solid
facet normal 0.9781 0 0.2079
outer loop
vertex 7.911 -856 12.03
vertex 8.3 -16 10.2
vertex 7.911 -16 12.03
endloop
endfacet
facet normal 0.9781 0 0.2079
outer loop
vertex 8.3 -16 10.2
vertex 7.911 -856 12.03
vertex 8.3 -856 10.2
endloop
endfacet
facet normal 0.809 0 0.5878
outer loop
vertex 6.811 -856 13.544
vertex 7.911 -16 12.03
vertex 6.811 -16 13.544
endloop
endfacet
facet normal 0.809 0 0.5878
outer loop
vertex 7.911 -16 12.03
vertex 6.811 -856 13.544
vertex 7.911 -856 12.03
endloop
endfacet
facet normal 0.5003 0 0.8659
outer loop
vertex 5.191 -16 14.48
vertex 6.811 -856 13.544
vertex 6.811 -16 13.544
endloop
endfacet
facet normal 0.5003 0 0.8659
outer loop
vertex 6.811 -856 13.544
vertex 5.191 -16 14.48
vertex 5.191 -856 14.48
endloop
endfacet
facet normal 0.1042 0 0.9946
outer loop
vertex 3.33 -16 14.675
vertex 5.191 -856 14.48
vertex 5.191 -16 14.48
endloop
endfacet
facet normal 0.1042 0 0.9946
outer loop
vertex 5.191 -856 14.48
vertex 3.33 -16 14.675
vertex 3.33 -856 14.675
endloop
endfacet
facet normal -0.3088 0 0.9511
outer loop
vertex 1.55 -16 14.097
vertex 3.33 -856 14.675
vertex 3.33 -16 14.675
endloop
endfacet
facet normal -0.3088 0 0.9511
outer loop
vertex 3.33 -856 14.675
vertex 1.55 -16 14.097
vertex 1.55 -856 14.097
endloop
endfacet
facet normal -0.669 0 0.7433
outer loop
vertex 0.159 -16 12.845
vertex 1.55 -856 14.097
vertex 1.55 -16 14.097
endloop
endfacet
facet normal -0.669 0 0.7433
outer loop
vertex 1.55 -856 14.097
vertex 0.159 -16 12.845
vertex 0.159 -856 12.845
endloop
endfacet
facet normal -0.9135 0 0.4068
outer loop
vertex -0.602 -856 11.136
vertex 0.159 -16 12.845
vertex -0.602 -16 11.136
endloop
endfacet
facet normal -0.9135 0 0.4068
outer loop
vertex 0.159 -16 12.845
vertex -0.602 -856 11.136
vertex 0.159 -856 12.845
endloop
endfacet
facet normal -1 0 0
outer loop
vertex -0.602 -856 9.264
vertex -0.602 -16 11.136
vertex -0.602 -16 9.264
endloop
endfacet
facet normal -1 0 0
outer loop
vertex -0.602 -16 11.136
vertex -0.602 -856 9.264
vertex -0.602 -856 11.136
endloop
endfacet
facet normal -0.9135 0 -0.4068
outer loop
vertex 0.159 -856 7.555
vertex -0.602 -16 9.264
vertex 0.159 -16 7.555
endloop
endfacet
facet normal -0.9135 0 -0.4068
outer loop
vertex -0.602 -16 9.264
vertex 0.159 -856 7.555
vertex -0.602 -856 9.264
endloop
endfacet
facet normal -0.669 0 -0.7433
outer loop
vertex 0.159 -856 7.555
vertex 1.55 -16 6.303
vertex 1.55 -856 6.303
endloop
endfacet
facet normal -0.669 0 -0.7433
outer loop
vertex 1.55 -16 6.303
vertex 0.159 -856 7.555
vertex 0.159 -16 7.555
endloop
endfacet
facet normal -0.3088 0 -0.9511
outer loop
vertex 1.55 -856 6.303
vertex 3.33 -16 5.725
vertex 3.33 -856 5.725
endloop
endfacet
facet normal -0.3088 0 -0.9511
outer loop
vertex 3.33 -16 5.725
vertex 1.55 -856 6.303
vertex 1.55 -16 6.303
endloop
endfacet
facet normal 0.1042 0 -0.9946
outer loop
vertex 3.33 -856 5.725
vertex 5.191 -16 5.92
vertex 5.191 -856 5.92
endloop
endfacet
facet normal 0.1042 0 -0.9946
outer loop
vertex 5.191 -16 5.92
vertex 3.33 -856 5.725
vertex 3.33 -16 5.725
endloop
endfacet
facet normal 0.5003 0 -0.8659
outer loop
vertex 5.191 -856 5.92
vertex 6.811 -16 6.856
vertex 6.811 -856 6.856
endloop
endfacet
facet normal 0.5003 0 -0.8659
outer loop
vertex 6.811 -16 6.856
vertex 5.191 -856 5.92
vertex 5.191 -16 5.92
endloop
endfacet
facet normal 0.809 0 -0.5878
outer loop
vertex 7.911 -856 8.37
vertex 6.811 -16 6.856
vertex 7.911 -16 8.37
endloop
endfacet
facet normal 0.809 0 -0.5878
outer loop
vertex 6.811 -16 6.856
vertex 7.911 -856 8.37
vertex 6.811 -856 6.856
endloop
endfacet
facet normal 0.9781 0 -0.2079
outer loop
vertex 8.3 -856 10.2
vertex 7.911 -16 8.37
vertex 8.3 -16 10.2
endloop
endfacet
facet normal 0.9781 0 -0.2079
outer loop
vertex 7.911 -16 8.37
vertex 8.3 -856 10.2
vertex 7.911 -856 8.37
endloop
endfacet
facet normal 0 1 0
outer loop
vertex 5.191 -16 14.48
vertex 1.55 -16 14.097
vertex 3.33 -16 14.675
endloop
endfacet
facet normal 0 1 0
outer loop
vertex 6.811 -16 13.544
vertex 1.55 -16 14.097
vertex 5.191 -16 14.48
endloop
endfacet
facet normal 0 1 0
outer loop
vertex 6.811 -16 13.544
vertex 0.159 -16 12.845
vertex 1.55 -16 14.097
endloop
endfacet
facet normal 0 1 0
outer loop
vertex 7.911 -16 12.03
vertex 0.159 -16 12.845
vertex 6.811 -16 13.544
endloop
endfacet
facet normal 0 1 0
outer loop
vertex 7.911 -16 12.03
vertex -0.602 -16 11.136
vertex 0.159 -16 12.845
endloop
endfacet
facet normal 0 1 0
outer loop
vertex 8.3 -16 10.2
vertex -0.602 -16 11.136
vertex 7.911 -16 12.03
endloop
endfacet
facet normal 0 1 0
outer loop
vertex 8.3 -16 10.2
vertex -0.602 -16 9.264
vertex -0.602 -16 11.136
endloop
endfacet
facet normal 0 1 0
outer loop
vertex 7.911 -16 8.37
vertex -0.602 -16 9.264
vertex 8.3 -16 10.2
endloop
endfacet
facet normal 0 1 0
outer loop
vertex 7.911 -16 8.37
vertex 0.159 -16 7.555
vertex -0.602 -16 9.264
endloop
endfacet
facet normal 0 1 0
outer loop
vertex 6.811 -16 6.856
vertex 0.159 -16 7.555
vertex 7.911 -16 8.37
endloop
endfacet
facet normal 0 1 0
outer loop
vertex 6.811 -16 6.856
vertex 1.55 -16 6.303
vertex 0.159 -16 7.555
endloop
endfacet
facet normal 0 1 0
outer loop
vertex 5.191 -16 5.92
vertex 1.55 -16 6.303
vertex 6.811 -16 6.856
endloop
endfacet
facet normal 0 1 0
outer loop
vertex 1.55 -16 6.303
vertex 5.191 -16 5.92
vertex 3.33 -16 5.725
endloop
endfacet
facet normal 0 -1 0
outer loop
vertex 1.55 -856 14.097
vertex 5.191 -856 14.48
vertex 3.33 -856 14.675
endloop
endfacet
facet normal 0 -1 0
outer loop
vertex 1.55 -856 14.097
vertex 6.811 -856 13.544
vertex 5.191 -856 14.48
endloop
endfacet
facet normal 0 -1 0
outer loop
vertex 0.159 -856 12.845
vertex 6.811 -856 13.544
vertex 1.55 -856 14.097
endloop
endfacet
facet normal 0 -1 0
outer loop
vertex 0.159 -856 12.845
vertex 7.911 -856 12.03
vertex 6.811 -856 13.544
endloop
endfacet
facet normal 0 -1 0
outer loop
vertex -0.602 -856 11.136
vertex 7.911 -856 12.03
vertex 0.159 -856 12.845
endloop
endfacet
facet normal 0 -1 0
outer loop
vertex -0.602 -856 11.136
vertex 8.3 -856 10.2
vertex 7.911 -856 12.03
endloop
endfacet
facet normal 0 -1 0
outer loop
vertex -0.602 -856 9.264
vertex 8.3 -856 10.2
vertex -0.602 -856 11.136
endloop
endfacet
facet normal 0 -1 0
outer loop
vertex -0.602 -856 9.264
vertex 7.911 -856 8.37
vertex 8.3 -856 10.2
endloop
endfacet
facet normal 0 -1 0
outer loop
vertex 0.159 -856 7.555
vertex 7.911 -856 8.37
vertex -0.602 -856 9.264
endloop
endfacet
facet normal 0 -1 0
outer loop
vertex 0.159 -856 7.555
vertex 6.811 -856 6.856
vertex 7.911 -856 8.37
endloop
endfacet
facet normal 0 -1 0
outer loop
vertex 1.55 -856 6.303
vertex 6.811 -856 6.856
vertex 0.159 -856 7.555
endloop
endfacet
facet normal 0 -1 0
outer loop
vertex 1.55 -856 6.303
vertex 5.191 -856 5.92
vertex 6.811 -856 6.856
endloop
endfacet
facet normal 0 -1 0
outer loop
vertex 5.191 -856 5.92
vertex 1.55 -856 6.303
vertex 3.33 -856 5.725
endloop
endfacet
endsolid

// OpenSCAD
// file: rib.scad
module solid_rib(){
linear_extrude(file = "rib/NACA_4415_circles_lighter.dxf",
height = 4, convexity = 10
);
}


module rib(rod_leading){
difference(){
solid_rib();
translate([3.8,10.2,-1])
cylinder(r=rod_leading/2,h=100);

translate([146,0,-10])
cube([30,4,100]);

translate([54,0,-10])
cube([5,5,100]);

translate([54,23,-10])
cube([5,5,100]);

}
}

rib(8,6);
// main file
 
use<rib.scad>;

module vrib(){
rotate([90,0,0])
rib(8,6);
}

module rods_left_wing(){

translate([0,-52,0]){
// Front rod
translate([0,50,0])
rotate([90,0,0])
translate([3.8,10.2,14])
cylinder(r=9/2,h=840);



}
}

module left_wing(){

rods_left_wing();

translate([0,-52,0]){


// Ribs
for(i=[0:6])
translate([0,-i*((850-50)/6),0])vrib();
}

}

left_wing();
